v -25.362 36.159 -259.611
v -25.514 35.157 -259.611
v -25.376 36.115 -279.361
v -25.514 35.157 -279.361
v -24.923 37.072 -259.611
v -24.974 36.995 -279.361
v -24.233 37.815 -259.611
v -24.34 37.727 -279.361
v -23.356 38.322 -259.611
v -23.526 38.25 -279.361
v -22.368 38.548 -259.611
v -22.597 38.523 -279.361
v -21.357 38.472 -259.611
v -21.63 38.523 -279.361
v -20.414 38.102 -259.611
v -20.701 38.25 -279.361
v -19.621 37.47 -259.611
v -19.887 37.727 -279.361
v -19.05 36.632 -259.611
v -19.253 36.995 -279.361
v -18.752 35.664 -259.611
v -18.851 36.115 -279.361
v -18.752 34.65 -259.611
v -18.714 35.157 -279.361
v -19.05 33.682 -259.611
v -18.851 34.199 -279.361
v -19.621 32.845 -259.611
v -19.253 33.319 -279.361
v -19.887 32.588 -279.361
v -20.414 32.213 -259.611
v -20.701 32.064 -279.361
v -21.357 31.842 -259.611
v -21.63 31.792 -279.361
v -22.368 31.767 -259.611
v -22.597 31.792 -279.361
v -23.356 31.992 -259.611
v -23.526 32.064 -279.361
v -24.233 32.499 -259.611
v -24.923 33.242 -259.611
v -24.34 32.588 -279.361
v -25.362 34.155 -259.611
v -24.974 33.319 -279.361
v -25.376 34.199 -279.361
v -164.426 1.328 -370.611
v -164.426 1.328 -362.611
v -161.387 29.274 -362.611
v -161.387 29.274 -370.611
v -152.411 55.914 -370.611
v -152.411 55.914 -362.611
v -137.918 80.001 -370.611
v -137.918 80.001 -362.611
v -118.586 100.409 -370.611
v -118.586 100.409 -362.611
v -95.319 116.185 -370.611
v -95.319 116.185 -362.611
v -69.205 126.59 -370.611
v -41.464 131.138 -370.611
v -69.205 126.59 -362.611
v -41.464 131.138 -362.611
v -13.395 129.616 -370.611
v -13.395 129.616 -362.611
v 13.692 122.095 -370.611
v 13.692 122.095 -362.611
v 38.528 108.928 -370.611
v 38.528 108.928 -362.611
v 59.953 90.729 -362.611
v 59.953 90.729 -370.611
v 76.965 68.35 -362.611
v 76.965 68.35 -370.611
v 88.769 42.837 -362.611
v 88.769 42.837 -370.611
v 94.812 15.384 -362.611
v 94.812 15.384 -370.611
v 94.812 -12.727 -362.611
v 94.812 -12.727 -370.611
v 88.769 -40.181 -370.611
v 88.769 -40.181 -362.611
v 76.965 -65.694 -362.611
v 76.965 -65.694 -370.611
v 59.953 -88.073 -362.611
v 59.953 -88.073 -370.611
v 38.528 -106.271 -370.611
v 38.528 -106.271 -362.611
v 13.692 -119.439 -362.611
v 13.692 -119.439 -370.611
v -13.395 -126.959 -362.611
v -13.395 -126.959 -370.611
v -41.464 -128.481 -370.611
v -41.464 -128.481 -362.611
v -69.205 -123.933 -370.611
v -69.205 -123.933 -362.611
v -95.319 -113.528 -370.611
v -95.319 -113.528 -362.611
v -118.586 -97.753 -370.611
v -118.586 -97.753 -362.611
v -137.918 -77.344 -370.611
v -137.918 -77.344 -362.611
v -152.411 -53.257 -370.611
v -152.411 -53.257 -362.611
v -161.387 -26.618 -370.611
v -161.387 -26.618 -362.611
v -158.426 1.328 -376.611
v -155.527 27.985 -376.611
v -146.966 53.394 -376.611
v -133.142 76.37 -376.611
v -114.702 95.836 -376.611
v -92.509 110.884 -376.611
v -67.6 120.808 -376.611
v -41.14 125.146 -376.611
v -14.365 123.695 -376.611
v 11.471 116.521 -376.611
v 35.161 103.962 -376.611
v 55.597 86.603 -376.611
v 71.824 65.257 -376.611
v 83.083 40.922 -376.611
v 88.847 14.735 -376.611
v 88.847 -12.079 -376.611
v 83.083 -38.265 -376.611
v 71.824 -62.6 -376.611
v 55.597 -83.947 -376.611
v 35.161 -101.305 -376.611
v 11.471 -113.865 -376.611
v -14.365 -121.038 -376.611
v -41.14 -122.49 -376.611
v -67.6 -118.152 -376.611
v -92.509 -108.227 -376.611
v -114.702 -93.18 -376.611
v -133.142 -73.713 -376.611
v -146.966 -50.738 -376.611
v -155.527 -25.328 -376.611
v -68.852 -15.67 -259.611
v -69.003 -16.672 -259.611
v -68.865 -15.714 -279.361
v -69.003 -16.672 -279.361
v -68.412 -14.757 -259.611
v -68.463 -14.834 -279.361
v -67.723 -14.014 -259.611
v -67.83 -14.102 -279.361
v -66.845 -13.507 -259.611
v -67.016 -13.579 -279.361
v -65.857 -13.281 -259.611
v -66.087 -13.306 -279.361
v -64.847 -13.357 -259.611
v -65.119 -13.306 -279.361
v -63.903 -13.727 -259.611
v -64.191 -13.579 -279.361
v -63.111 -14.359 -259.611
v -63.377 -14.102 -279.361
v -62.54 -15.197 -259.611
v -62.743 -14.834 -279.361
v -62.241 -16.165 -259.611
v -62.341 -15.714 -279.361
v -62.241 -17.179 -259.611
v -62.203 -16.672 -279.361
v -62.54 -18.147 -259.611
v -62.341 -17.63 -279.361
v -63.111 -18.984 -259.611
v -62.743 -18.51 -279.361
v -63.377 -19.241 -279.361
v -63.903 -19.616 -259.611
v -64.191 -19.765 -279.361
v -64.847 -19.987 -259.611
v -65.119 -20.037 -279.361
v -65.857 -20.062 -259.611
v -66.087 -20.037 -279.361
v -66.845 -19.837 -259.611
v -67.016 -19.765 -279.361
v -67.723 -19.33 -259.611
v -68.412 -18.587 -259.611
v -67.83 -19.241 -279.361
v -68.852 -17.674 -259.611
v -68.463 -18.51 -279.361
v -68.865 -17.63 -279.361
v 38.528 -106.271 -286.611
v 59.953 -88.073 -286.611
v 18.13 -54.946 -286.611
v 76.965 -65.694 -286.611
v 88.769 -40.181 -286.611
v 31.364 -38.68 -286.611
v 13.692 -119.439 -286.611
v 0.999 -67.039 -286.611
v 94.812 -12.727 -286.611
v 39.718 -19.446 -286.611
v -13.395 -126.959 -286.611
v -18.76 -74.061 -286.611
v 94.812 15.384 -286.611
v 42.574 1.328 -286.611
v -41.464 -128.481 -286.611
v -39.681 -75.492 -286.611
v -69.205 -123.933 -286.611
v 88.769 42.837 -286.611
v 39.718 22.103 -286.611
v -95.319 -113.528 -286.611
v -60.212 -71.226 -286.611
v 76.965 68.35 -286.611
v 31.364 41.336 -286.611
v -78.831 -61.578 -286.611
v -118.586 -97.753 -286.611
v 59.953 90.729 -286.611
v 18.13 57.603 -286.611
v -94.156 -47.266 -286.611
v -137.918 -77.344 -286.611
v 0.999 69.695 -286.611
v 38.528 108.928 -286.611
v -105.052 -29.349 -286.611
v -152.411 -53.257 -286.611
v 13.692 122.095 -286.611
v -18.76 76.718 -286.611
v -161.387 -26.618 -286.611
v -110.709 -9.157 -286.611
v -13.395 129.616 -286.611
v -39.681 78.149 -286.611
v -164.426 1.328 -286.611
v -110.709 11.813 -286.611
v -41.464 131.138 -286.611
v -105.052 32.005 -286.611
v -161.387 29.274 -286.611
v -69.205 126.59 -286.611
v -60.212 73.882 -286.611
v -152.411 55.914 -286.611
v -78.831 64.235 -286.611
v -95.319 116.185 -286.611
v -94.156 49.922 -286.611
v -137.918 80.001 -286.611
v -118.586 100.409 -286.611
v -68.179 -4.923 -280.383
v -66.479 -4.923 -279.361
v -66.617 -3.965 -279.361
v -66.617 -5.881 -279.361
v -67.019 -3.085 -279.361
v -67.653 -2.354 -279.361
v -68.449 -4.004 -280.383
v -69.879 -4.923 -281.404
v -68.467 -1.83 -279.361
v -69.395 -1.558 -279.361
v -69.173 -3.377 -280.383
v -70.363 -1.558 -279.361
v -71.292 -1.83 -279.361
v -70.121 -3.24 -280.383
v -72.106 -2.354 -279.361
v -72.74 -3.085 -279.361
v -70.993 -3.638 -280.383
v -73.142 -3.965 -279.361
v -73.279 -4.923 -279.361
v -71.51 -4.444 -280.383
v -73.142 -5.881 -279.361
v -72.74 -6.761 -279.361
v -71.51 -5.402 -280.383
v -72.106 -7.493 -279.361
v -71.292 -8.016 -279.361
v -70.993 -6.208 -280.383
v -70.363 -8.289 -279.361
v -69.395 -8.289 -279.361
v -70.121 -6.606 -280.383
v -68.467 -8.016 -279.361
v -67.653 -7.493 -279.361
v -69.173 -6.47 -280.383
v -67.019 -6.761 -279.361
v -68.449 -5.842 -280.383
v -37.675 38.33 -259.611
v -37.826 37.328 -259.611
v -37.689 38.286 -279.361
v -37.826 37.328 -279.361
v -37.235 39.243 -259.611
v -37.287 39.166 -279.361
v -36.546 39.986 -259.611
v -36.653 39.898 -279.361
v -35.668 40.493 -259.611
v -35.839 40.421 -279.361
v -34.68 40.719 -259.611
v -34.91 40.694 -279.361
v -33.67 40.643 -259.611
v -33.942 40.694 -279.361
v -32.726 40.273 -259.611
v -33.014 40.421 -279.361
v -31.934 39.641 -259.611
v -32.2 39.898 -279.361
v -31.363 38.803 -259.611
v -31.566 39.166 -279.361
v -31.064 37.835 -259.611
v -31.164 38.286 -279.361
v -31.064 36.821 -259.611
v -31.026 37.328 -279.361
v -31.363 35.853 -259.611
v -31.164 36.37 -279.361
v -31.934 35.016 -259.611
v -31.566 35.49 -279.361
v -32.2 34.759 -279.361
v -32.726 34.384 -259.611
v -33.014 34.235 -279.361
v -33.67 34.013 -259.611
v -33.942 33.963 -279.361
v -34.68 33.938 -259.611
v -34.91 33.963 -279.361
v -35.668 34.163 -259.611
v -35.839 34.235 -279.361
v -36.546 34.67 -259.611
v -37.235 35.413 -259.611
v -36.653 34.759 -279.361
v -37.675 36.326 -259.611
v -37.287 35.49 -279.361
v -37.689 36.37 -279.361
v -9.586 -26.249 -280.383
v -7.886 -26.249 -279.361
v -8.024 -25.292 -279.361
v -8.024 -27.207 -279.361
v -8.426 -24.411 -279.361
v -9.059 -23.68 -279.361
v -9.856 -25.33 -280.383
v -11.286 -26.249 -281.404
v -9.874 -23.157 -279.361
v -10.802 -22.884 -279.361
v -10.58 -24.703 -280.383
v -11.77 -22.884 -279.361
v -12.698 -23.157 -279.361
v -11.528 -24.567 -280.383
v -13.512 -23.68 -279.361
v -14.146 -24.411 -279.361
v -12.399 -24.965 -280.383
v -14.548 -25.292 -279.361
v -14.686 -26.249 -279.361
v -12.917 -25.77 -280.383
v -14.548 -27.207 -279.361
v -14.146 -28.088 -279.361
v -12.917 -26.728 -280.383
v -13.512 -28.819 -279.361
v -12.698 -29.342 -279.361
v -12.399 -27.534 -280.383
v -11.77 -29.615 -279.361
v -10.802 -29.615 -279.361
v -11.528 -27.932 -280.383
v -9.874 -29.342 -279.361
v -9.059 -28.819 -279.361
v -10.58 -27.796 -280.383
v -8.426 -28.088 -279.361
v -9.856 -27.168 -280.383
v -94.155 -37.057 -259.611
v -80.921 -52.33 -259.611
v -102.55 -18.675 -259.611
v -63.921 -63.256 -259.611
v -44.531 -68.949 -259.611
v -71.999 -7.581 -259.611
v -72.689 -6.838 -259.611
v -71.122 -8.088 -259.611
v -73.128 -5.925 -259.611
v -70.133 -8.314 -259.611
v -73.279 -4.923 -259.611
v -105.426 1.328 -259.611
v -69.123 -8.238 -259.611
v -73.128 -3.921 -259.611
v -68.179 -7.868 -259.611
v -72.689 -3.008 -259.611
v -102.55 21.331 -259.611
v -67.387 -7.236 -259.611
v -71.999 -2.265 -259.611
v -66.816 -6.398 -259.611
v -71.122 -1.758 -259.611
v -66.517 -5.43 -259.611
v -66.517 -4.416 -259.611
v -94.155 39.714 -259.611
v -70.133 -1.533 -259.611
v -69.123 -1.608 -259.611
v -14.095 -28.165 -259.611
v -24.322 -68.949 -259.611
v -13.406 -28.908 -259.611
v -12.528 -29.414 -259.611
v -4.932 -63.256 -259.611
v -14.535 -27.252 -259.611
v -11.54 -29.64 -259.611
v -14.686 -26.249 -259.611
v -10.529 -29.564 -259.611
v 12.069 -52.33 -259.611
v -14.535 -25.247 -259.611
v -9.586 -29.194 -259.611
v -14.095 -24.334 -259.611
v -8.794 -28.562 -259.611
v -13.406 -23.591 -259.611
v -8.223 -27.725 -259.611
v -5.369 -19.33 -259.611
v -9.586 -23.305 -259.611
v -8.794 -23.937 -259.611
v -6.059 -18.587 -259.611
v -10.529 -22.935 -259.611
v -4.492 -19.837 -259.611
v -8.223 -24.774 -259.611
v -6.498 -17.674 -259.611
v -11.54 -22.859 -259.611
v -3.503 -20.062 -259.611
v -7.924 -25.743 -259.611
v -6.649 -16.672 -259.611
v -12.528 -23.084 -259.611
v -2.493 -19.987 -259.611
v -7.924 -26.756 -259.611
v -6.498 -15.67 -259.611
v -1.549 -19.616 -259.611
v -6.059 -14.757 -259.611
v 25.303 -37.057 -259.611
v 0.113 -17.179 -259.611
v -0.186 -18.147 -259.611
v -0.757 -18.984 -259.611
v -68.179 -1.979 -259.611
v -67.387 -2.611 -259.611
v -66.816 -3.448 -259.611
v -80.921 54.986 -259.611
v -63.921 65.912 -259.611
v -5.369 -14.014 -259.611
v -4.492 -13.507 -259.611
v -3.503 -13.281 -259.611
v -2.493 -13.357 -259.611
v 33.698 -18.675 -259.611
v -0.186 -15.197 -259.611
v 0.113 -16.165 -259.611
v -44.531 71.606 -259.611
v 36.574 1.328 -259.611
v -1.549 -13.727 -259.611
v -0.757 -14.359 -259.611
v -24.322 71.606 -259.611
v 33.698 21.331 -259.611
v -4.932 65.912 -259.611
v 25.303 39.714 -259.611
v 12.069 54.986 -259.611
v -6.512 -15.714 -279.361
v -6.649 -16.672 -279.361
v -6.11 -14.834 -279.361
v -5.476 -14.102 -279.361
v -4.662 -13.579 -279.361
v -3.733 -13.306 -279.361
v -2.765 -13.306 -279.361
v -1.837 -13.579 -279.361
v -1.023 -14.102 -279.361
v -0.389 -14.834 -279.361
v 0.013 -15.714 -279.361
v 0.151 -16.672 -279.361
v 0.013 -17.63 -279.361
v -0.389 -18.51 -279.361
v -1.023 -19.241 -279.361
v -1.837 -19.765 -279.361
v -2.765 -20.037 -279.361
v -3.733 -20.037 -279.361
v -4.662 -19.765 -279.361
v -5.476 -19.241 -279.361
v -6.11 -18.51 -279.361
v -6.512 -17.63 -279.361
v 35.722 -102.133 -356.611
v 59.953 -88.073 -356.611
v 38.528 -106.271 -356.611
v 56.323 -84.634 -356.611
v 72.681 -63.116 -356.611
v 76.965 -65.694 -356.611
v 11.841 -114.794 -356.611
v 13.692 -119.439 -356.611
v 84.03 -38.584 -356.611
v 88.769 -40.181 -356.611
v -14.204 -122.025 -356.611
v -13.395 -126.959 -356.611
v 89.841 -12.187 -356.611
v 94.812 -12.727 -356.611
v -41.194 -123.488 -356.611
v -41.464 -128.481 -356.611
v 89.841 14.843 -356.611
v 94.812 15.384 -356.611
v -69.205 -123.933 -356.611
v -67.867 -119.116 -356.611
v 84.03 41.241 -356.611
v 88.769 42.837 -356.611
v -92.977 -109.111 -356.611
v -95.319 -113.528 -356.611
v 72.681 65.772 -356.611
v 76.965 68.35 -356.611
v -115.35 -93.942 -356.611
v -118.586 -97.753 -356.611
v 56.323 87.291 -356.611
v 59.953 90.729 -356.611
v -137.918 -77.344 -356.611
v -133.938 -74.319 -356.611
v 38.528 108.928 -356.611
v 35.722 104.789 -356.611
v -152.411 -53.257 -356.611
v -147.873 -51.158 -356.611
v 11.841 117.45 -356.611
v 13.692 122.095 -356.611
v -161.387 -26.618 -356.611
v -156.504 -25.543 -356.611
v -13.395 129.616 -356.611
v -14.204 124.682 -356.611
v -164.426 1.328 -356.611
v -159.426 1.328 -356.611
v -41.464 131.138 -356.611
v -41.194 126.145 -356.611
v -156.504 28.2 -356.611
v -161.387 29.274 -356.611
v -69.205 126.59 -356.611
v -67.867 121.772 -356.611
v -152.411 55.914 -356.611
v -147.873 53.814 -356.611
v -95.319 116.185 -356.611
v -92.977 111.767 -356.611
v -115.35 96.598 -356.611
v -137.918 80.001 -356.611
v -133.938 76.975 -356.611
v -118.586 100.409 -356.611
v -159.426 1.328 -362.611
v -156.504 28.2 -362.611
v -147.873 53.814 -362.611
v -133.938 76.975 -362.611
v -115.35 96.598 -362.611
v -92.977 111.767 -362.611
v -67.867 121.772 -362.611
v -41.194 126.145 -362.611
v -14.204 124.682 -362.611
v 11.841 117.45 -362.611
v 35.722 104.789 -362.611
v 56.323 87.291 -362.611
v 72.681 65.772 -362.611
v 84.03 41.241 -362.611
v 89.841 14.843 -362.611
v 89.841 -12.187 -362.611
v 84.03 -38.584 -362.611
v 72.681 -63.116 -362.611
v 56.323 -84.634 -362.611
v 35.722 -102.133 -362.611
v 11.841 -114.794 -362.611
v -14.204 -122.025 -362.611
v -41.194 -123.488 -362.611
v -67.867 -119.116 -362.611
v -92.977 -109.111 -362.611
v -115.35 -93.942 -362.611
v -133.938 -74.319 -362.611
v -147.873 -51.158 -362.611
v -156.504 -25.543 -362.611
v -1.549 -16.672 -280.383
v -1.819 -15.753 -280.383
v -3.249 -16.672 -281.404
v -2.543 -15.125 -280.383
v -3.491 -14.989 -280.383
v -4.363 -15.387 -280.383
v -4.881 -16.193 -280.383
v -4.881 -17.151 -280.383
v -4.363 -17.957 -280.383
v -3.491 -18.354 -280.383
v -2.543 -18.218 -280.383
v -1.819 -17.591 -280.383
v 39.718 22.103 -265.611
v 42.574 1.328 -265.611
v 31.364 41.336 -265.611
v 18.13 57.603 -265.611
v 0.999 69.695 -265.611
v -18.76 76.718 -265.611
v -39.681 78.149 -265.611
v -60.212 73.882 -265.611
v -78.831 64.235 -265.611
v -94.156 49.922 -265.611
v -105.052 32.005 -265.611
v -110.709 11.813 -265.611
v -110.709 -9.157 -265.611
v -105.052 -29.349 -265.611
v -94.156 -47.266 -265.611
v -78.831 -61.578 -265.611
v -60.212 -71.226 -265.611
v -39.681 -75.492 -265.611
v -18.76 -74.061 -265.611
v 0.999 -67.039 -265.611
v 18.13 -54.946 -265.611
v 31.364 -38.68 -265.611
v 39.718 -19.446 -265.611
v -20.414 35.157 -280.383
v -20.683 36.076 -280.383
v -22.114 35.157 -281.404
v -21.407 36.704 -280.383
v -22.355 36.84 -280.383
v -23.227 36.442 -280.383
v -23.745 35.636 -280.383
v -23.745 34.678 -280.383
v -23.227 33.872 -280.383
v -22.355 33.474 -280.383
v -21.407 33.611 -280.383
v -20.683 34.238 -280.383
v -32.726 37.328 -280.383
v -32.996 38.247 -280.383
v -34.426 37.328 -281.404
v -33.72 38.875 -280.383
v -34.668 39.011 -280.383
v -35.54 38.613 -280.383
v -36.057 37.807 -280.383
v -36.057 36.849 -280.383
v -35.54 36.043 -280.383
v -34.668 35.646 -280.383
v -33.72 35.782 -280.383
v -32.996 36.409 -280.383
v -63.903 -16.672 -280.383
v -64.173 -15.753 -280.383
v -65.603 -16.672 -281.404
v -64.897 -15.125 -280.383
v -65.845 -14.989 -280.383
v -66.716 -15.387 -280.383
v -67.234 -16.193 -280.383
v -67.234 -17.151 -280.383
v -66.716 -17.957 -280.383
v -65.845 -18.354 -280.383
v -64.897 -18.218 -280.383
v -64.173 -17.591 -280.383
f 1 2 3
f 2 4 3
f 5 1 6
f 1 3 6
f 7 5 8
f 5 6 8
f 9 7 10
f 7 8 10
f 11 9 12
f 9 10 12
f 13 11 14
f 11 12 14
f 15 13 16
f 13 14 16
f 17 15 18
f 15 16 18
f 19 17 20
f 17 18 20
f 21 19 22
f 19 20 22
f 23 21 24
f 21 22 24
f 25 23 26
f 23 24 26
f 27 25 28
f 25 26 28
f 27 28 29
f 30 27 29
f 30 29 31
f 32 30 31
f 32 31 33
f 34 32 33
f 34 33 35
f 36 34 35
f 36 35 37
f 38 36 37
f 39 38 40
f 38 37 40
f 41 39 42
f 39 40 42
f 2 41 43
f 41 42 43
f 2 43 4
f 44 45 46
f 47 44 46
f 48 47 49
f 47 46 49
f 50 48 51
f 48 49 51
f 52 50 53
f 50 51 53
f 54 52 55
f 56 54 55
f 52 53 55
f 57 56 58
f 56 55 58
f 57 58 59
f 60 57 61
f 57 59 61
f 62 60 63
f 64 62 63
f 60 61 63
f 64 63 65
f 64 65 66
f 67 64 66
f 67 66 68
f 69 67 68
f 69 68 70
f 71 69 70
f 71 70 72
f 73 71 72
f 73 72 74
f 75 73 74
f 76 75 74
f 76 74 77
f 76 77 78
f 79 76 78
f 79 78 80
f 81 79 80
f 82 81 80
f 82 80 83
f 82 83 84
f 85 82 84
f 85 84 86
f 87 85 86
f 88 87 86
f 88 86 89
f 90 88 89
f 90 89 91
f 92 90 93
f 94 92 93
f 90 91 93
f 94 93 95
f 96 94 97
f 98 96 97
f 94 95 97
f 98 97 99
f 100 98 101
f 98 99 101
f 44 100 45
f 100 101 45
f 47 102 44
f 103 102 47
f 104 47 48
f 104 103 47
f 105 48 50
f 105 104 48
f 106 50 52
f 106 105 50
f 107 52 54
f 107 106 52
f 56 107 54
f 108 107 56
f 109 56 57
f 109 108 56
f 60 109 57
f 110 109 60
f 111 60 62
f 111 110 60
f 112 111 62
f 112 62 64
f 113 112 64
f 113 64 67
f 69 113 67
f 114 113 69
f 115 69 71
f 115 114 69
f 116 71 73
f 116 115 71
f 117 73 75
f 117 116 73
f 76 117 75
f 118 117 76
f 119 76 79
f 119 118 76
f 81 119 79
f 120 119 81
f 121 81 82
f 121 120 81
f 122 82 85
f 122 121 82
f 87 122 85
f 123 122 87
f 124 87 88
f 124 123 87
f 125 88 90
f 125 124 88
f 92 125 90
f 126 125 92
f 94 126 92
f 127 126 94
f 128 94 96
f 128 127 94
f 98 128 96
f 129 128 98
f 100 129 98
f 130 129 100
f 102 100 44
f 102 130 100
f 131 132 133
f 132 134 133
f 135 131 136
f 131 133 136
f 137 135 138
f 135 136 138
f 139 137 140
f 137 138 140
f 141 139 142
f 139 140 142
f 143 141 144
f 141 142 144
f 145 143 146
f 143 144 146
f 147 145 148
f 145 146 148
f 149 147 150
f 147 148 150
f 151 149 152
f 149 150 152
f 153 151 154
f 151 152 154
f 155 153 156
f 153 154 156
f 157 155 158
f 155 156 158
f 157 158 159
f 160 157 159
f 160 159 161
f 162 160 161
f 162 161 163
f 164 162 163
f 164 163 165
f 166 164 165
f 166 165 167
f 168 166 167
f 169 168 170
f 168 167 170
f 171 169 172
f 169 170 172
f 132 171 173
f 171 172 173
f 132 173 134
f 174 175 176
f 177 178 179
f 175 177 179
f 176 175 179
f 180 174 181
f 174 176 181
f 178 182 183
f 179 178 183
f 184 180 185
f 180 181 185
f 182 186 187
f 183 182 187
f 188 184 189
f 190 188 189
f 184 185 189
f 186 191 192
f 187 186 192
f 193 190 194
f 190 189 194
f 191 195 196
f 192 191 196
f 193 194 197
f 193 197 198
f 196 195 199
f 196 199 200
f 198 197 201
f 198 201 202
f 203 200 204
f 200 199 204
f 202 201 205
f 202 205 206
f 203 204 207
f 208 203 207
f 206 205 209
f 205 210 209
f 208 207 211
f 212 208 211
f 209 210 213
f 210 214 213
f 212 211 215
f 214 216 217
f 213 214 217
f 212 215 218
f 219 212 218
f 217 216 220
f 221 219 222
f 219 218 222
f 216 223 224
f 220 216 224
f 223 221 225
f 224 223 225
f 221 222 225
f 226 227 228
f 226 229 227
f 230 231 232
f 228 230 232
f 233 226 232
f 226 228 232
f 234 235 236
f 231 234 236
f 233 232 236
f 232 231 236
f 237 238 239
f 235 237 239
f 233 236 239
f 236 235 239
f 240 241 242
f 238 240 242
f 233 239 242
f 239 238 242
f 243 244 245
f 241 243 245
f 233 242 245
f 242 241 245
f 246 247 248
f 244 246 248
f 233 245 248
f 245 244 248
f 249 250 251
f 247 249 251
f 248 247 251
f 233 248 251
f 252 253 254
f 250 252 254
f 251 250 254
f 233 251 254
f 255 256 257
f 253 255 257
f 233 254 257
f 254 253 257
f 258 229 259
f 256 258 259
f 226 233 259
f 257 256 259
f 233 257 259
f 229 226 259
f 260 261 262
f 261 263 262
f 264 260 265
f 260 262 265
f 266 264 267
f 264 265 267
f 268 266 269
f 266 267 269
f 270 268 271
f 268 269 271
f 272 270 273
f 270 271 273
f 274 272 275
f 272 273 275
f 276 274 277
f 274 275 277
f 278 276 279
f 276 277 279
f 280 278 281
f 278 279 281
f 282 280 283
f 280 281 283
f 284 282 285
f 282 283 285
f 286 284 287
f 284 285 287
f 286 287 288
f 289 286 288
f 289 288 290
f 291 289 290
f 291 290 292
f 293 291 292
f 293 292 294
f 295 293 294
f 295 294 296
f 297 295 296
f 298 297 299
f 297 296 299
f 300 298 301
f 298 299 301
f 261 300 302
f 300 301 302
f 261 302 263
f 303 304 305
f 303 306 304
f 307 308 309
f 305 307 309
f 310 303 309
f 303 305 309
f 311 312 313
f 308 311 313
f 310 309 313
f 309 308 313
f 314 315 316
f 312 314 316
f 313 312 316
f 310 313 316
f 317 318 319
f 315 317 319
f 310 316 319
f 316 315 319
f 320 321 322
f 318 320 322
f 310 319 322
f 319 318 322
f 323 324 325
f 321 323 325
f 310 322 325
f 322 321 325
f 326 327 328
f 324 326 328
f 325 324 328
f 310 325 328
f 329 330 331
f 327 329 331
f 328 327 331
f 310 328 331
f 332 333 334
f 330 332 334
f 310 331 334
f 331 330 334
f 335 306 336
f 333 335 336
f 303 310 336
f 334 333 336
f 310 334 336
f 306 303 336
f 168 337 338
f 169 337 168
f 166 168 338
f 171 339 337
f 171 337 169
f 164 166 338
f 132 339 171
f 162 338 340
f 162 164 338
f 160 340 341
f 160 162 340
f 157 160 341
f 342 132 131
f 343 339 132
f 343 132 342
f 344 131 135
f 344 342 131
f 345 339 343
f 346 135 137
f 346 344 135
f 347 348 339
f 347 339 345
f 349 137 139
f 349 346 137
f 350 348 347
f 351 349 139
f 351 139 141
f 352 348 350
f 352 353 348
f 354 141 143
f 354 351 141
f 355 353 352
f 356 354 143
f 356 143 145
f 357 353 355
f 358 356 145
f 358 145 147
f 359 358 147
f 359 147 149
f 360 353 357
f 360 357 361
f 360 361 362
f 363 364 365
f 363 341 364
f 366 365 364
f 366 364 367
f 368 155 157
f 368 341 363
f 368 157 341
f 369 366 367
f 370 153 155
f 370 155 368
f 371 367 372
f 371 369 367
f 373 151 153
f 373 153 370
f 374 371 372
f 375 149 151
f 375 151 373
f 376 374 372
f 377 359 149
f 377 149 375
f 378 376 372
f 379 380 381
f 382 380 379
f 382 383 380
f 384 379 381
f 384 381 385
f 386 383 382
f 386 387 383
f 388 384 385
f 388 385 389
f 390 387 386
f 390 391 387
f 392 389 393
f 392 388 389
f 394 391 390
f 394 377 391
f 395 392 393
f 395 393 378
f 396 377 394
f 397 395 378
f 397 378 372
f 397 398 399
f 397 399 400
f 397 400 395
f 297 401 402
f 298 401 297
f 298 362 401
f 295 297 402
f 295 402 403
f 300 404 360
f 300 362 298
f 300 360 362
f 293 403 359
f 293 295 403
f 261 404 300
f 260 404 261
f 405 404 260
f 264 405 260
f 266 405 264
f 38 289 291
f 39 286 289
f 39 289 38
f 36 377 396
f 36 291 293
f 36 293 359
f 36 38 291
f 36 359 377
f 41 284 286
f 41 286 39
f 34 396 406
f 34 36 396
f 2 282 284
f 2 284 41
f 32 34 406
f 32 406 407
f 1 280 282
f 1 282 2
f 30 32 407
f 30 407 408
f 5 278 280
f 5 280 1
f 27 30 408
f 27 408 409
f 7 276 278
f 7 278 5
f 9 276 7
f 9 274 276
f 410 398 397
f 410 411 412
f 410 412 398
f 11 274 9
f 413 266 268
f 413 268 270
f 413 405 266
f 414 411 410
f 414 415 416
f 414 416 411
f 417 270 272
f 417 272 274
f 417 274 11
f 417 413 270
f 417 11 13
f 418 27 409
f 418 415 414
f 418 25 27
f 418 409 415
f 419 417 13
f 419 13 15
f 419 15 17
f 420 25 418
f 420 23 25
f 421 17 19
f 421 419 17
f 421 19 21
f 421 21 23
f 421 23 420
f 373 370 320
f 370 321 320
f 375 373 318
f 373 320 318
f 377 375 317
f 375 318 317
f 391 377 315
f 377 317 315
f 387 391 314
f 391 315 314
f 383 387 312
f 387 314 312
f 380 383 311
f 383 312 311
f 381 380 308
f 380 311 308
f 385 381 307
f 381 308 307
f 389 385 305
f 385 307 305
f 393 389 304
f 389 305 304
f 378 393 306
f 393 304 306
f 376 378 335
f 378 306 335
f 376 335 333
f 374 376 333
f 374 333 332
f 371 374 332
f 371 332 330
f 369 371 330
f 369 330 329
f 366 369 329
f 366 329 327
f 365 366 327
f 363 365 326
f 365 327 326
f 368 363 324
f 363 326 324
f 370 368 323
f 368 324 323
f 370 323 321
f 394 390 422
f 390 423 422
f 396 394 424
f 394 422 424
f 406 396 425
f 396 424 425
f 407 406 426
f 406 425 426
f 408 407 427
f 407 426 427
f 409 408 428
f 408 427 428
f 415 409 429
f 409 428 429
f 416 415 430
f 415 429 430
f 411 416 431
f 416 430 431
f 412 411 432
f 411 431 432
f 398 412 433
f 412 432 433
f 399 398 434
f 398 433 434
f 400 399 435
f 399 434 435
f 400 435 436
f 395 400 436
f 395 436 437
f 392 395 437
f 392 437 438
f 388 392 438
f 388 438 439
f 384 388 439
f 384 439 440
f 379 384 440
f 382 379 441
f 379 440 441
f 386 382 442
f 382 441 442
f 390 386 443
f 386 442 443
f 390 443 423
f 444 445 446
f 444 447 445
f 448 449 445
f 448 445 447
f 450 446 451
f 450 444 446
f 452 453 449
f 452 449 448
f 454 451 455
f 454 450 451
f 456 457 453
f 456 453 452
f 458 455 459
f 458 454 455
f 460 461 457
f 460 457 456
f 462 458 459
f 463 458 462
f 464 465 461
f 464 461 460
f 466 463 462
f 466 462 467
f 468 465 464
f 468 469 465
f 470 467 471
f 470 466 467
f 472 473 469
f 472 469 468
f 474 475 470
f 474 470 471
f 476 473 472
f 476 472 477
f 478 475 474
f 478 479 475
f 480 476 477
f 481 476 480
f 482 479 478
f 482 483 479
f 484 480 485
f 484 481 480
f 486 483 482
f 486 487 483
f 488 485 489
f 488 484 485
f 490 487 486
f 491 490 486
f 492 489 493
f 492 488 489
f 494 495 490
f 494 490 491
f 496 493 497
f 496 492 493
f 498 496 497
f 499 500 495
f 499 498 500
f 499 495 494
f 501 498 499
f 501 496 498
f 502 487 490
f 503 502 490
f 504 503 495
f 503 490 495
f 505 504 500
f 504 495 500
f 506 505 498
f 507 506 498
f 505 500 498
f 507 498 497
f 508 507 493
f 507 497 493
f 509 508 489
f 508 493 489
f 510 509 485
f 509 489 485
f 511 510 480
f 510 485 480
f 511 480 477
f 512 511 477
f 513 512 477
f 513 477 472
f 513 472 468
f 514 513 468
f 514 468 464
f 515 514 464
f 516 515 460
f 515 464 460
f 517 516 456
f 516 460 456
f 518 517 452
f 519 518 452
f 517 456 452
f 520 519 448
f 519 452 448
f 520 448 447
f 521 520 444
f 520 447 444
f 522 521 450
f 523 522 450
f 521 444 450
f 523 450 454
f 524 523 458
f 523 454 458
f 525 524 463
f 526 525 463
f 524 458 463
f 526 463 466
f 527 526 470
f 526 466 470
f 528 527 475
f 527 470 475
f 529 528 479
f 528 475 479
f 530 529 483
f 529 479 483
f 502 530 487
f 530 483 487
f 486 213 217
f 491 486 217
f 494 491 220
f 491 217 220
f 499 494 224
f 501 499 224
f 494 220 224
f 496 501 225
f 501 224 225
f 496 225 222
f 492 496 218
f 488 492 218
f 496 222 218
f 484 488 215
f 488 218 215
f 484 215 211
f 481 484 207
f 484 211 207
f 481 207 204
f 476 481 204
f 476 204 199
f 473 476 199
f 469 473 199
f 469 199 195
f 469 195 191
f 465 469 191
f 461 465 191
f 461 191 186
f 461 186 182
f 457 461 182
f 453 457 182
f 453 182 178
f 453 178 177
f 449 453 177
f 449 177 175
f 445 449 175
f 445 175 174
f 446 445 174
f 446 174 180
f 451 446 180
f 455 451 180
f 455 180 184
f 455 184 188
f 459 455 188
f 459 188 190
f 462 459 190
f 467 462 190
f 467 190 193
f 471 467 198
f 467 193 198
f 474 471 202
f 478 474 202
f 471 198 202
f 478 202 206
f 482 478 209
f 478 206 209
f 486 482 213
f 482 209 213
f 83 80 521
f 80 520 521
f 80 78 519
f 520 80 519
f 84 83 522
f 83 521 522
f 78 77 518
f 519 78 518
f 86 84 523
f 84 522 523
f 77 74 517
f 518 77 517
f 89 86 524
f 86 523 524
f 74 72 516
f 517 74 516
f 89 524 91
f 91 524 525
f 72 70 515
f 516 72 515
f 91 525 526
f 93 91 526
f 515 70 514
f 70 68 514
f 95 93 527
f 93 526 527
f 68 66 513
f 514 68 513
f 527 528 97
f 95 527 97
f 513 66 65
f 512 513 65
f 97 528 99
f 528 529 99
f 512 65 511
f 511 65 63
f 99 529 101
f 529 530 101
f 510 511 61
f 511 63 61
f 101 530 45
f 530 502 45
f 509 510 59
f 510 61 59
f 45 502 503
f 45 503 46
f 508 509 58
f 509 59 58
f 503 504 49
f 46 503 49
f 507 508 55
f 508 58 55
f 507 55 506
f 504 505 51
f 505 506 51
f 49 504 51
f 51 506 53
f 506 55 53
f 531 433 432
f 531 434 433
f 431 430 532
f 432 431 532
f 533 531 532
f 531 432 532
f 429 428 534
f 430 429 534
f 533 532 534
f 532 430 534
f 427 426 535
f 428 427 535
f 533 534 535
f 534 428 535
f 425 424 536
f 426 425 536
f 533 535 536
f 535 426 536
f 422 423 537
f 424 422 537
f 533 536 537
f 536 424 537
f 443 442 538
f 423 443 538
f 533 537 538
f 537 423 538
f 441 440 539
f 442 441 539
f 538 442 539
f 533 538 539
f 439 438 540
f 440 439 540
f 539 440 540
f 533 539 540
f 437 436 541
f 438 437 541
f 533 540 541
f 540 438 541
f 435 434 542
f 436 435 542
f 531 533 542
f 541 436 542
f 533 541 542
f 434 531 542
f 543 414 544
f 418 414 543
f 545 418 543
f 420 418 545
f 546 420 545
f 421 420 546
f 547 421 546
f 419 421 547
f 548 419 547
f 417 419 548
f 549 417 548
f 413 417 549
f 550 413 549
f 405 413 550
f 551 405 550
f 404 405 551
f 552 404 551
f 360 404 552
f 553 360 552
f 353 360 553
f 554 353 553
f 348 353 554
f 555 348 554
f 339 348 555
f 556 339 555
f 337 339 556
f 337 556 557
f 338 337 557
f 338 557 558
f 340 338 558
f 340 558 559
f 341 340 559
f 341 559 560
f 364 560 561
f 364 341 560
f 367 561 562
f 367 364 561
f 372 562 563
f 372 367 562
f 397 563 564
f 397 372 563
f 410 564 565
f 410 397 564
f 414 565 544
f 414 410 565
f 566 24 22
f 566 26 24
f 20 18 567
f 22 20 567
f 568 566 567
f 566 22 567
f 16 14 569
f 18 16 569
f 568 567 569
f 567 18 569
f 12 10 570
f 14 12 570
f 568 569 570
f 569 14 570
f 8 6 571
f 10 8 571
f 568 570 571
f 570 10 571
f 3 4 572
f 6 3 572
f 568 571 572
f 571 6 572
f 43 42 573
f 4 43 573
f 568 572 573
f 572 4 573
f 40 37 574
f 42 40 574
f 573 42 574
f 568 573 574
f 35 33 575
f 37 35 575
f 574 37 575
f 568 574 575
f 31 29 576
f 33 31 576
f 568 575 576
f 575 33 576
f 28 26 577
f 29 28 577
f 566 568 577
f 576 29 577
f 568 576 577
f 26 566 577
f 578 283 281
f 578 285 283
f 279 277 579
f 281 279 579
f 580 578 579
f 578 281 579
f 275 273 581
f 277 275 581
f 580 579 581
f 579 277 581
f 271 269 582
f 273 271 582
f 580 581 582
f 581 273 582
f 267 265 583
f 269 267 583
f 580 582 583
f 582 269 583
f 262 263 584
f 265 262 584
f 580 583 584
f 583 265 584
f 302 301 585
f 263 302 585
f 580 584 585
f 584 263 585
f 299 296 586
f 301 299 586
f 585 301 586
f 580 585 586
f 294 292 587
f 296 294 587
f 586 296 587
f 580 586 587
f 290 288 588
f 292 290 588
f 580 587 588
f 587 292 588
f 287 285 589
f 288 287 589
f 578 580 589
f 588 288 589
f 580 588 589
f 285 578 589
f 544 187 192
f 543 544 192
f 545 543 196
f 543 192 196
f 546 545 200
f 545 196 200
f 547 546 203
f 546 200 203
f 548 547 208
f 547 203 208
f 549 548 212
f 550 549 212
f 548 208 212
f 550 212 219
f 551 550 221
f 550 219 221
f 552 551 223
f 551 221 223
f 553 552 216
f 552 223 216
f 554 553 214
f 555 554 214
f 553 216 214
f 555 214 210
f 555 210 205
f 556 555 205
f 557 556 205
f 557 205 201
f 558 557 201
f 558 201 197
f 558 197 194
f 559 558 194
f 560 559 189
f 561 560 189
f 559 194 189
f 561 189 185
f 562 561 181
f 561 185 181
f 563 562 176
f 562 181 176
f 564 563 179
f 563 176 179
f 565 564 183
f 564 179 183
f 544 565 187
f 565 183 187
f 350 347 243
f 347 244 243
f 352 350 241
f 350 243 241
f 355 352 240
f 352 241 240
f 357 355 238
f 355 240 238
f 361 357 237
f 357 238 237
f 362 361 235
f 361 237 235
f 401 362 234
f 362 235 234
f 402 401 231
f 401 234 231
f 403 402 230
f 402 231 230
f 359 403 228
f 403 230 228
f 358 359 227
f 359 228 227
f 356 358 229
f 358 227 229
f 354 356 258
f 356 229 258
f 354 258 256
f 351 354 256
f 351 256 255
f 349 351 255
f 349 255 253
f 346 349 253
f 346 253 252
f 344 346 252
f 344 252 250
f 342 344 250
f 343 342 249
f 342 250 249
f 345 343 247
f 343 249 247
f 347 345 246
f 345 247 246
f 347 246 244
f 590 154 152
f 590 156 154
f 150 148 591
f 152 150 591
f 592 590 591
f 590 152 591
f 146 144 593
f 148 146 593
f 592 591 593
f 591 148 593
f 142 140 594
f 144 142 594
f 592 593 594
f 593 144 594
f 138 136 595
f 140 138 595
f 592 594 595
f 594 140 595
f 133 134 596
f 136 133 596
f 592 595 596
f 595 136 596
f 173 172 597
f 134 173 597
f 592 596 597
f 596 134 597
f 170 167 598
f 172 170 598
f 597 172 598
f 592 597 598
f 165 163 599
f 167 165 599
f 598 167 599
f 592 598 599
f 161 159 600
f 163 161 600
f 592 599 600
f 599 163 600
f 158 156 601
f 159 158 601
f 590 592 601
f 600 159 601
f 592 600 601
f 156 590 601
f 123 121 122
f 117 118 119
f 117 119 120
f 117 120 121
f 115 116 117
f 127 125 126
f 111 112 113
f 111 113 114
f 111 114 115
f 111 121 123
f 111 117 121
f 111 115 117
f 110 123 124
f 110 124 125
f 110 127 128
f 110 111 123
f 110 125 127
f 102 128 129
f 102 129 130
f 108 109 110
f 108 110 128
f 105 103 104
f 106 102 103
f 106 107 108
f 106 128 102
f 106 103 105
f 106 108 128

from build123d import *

# Parameters (mm, degrees)
BOSS_EXTRUDE1_START        = -120.0001
BOSS_EXTRUDE1_OUTLINE_R    = 130
BOSS_EXTRUDE1_DEPTH        = 90.0001
SKETCH2_R                  = 130
SKETCH2_R_2                = 125
CUT_EXTRUDE1_DEPTH         = 6
SKETCH3_R                  = 77
BOSS_EXTRUDE2_DEPTH        = 26.9999
M8X1_25_TAPPED_HOLE1_D     = 6.8
M8X1_25_TAPPED_HOLE1_DEPTH = 19.75
M8X1_25_TAPPED_HOLE1_TIP   = 2.042926105
CHAMFER1_SIZE              = 6
CHAMFER2_SIZE              = 6


# Read off the part's stored shape, not the designer's step: Boss-Extrude1
with BuildPart() as part:
    # Boss-Extrude1 outline → Boss-Extrude1 (new body)
    with BuildSketch(Plane(origin=(0, 0, -406.611081847), x_dir=(-1, 0, 0), z_dir=(0, 0, -1)).offset(BOSS_EXTRUDE1_START)):
        with Locations((34.426276825, 1.328199188)):
            Circle(BOSS_EXTRUDE1_OUTLINE_R)
    extrude(amount=BOSS_EXTRUDE1_DEPTH)

    # Sketch2 → Cut-Extrude1 (cut)
    with BuildSketch(Plane(origin=(0, 0, -356.611081847), x_dir=(-1, 0, 0), z_dir=(0, 0, -1))):
        with Locations((34.426276825, 1.328199188)):
            Circle(SKETCH2_R)
        with Locations((34.426276825, 1.328199188)):
            Circle(SKETCH2_R_2, mode=Mode.SUBTRACT)
    extrude(amount=CUT_EXTRUDE1_DEPTH, mode=Mode.SUBTRACT)

    # Sketch3 → Boss-Extrude2 (add)
    with BuildSketch(Plane.XY.offset(-286.610981847)):
        with Locations((-34.426276825, 1.328199188)):
            Circle(SKETCH3_R)
    extrude(amount=BOSS_EXTRUDE2_DEPTH)

    # M8x1.25 Tapped Hole1
    with Locations(Plane.XY.offset(-259.611081847)):
        with Locations((-34.426276825, 37.328199188), (-22.113551665, 35.157133536), (-3.249362288, -16.671800812), (-11.285922876, -26.249400764), (-65.603191361, -16.671800812), (-69.879355933, -4.923135208)):
            Hole(M8X1_25_TAPPED_HOLE1_D / 2, depth=M8X1_25_TAPPED_HOLE1_DEPTH)
            with Locations((0, 0, -(M8X1_25_TAPPED_HOLE1_DEPTH + M8X1_25_TAPPED_HOLE1_TIP / 2))):  # 118° drill point
                Cone(0, M8X1_25_TAPPED_HOLE1_D / 2, M8X1_25_TAPPED_HOLE1_TIP, mode=Mode.SUBTRACT)

    # Chamfer1
    chamfer1_edges = [part.edges().sort_by_distance(p)[0] for p in [
        (-111.426276825, 1.328199188, -259.611081847),
    ]]
    chamfer(chamfer1_edges, length=CHAMFER1_SIZE)

    # Chamfer2
    chamfer2_edges = [part.edges().sort_by_distance(p)[0] for p in [
        (95.573723175, 1.328199188, -376.611081847),
    ]]
    chamfer(chamfer2_edges, length=CHAMFER2_SIZE)


solid = part.part
